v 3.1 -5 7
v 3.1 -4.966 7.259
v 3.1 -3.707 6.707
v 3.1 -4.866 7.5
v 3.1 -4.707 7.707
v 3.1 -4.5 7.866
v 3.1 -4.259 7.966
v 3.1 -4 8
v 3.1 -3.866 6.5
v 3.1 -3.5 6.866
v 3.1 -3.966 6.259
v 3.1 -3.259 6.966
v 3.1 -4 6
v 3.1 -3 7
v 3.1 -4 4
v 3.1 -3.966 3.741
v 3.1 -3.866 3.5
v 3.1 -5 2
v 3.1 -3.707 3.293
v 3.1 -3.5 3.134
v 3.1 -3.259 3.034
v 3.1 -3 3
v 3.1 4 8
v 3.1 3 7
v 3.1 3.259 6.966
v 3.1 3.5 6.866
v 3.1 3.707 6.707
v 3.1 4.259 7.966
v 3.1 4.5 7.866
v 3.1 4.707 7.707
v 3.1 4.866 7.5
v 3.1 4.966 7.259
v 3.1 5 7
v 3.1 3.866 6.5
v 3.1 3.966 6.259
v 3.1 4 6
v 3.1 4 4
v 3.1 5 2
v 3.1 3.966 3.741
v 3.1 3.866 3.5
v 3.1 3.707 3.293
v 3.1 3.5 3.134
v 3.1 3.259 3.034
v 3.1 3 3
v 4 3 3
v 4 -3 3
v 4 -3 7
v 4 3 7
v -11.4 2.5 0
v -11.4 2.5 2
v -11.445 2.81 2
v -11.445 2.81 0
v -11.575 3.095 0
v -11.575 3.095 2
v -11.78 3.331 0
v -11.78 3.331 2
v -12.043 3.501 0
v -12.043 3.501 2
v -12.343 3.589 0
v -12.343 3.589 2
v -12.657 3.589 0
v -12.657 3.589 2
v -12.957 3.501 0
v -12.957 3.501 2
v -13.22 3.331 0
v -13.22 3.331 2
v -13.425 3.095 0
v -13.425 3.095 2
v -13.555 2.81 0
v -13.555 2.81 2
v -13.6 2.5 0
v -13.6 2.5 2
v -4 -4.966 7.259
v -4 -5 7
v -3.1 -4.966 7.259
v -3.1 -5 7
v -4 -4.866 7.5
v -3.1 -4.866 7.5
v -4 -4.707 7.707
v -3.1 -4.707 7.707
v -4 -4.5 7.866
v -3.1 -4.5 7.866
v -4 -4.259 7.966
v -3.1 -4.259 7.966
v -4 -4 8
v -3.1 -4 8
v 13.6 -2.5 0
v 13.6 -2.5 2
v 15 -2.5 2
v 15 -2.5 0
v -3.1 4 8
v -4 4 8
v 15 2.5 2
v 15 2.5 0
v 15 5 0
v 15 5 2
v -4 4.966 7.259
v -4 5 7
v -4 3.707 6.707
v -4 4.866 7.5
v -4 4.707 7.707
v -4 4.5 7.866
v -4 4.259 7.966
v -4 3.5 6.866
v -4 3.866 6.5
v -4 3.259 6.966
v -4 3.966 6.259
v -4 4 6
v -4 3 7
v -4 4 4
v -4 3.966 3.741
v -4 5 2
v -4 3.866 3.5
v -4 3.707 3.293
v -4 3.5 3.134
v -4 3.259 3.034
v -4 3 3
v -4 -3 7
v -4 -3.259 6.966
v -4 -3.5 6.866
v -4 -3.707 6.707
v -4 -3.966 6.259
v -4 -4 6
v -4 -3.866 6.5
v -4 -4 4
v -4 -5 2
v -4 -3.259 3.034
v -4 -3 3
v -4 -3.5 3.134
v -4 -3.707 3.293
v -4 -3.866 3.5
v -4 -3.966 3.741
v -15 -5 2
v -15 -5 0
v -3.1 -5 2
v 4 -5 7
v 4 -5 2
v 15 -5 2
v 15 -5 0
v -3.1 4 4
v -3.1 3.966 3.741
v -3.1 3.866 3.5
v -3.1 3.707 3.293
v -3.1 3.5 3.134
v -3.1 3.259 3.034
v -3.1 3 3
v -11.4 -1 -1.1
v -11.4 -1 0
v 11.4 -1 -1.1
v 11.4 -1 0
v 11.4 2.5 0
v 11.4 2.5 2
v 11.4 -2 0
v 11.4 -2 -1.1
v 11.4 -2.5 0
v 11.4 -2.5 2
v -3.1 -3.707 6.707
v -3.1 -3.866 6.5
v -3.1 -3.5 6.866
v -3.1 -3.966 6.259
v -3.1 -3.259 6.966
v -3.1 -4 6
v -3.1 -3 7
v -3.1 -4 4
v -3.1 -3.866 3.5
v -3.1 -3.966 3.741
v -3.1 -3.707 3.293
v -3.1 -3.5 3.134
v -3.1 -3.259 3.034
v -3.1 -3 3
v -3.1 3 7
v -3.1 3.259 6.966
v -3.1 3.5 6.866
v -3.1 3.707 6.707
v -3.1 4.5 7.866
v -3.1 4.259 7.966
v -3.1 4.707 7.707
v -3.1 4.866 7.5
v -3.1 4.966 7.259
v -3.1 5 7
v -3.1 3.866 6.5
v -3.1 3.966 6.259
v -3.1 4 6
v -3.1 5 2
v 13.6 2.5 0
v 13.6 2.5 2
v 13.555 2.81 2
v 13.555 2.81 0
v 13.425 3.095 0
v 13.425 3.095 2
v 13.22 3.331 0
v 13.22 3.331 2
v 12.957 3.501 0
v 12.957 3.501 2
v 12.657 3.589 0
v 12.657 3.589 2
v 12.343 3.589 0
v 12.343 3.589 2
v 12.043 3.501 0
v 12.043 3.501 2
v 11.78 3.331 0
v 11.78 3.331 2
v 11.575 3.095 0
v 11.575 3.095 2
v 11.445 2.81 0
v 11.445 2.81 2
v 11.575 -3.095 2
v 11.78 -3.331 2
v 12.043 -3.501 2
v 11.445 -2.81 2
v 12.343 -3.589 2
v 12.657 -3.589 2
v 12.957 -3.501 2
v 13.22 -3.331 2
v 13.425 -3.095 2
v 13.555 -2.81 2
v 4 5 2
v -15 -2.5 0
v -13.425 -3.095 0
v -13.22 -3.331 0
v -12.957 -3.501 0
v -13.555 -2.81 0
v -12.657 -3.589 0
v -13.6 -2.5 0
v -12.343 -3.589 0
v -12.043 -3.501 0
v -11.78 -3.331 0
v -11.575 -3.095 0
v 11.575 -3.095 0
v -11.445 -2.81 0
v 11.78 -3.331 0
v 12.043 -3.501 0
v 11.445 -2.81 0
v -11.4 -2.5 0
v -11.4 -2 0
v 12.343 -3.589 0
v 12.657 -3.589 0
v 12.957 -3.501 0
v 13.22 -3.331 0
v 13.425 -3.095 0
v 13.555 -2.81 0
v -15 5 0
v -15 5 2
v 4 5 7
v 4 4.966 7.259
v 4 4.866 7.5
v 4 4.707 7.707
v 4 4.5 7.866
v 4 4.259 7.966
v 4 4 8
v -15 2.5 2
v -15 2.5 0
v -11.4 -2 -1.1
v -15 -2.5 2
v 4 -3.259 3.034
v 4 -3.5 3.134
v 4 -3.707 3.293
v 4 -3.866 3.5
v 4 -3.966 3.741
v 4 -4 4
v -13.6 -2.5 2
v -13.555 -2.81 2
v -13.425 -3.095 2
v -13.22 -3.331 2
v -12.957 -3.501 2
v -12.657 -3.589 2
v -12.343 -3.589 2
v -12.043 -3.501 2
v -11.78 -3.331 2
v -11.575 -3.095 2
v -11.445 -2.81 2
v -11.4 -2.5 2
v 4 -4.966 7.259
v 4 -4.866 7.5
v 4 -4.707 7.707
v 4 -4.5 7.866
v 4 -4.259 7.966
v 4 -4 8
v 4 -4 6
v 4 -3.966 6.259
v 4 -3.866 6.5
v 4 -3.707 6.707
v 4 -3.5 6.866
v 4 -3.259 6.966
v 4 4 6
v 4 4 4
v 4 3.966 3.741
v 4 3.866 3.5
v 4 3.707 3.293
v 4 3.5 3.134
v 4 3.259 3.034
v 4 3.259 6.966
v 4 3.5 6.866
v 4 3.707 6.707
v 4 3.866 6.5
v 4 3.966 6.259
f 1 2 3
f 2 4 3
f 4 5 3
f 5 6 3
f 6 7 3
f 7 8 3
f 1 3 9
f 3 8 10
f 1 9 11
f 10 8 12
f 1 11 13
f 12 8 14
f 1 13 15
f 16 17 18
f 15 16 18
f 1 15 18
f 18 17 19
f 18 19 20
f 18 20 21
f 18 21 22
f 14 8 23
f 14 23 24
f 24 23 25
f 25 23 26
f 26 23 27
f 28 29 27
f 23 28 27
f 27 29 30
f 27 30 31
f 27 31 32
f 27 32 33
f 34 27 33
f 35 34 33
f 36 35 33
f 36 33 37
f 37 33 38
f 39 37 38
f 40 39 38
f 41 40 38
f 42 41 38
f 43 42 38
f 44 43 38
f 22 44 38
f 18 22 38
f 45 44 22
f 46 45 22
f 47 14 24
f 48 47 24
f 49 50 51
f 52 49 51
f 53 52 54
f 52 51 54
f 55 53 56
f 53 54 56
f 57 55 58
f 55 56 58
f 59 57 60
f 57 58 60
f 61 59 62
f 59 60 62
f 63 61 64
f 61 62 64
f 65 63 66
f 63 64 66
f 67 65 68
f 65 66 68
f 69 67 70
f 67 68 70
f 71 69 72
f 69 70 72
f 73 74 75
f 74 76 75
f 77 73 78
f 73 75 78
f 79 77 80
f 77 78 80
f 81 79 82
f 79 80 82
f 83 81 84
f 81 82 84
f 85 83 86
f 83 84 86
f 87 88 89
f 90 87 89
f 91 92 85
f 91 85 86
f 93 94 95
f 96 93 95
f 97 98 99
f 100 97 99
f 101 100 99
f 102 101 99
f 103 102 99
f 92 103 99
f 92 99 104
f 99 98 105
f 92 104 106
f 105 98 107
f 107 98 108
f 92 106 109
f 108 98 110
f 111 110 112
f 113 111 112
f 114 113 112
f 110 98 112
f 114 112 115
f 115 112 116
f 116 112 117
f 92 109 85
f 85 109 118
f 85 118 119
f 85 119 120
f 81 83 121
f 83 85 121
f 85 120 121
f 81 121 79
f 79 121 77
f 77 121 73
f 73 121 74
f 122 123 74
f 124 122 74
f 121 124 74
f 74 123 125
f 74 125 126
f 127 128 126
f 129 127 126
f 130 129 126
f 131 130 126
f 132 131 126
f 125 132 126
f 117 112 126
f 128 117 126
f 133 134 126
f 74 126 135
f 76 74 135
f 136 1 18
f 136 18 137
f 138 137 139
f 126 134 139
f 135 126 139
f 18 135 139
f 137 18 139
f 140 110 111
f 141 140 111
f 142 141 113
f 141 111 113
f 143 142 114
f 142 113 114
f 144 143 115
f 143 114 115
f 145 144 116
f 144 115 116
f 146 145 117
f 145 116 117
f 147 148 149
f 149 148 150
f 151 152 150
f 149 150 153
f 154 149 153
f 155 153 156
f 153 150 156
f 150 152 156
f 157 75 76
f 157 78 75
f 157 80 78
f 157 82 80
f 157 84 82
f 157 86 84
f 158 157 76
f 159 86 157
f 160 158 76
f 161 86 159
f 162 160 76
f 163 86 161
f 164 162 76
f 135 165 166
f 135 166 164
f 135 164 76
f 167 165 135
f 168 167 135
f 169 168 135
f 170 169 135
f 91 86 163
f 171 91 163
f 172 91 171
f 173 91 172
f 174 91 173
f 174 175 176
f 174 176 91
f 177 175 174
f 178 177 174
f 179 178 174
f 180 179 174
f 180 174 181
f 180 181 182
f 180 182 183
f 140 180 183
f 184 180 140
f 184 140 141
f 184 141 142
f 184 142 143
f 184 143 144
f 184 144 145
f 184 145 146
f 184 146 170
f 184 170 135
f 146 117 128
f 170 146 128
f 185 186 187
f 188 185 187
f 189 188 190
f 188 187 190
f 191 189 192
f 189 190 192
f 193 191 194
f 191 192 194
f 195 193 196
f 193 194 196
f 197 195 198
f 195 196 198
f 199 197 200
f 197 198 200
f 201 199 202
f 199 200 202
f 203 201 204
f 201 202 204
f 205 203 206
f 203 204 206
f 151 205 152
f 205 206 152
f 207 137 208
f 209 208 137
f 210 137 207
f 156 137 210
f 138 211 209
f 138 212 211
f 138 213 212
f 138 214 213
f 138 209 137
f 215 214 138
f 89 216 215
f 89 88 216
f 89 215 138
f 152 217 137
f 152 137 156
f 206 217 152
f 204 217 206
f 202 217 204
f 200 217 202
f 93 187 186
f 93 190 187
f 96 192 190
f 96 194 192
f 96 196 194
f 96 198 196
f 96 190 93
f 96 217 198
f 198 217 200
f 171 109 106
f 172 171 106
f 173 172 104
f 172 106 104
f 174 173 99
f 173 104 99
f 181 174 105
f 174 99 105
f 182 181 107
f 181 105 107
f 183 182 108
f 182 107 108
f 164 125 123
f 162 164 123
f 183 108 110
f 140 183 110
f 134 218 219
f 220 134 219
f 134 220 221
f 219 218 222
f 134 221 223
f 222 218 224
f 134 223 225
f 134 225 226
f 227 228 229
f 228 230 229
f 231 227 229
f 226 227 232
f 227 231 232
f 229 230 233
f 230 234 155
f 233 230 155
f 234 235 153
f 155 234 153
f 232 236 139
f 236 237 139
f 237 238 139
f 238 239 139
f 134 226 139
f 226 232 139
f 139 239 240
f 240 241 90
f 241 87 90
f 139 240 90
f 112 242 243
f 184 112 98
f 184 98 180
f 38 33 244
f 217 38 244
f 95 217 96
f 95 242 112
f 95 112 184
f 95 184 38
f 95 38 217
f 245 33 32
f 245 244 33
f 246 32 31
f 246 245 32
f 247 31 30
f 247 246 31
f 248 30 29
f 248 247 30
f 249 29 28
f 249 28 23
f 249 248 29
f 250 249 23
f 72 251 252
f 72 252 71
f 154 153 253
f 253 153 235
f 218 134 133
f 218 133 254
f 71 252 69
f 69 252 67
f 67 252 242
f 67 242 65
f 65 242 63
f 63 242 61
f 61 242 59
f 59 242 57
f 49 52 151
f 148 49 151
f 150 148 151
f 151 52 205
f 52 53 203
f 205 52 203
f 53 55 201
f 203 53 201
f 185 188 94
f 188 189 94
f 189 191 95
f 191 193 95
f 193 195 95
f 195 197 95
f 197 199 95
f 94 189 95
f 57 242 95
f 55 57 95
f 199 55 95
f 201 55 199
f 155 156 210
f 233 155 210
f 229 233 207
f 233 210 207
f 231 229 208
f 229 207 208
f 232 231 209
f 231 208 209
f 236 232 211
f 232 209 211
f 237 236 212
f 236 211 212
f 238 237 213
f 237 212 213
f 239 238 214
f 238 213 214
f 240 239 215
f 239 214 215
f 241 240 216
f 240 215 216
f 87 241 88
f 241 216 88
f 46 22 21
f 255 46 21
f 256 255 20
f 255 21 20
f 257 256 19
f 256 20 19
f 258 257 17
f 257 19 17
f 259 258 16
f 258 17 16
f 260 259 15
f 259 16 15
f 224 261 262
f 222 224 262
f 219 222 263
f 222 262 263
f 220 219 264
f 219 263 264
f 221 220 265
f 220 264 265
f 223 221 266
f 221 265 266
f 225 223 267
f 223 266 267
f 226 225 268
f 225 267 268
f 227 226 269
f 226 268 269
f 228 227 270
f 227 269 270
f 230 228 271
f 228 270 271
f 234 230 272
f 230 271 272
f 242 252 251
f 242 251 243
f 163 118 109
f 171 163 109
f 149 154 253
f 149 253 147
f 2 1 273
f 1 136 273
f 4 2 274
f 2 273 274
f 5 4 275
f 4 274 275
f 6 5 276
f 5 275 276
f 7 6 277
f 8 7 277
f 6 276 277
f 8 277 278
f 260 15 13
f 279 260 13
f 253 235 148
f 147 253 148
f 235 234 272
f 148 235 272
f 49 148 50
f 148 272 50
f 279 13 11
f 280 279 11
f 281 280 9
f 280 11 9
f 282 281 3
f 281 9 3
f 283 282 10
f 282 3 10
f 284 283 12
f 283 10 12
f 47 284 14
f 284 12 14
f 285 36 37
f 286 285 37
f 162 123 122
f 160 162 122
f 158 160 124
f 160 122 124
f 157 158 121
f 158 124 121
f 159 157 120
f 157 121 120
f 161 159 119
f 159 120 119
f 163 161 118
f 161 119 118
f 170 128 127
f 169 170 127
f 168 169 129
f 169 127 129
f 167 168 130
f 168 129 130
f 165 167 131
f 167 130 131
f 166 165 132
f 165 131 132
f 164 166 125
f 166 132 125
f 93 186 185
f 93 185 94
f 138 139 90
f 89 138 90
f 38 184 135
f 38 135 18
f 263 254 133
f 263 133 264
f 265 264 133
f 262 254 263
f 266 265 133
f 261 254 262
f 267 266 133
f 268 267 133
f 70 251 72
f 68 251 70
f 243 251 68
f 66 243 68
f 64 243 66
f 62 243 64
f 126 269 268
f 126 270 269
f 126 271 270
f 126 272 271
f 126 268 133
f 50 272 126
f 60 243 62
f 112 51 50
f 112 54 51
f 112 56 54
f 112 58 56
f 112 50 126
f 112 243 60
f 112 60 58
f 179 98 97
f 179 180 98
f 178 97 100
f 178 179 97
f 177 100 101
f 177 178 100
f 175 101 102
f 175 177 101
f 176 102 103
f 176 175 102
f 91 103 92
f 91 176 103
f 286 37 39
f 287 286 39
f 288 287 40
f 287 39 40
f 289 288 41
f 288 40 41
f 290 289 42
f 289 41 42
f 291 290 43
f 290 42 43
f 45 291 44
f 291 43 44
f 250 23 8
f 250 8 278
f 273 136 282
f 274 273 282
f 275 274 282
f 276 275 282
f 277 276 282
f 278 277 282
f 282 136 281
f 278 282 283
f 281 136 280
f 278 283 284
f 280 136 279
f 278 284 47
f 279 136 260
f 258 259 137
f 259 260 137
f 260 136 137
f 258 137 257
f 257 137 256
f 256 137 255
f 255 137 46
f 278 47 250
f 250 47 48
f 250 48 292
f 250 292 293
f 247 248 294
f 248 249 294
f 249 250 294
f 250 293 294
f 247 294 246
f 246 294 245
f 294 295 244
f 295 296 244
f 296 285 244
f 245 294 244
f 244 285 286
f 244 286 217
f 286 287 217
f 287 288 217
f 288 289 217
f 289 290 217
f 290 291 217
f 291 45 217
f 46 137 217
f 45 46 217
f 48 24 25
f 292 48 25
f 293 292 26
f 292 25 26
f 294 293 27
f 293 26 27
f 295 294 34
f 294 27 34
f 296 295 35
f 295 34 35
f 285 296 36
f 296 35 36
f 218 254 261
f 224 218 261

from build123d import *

# Parameters (mm, degrees)
CROQUIS1_W              = 30
CROQUIS1_H              = 10
SALIENTE_EXTRUIR1_DEPTH = 2
CORTAR_EXTRUIR2_DEPTH   = 11
CROQUIS3_W              = 11.193843072
CROQUIS3_H              = 1
CROQUIS3_W_2            = 11.806156928
SALIENTE_EXTRUIR3_DEPTH = 1.5
CORTAR_EXTRUIR3_DEPTH   = 11.5
CROQUIS5_W              = 1.4
CROQUIS5_H              = 5
CORTAR_EXTRUIR4_DEPTH   = 10
CROQUIS6_W              = 8
CROQUIS6_H              = 5
SALIENTE_EXTRUIR4_DEPTH = 6
CROQUIS7_W              = 6.2
CROQUIS7_H              = 6
CORTAR_EXTRUIR5_DEPTH   = 11
CORTAR_EXTRUIR6_DEPTH   = 11
REDONDEO1_R             = 1
CROQUIS9_W              = 0.4
CROQUIS9_H              = 1
CORTAR_EXTRUIR7_DEPTH   = 23


with BuildPart() as part:
    # Croquis1 → Saliente-Extruir1 (new body)
    with BuildSketch(Plane.XY):
        Rectangle(CROQUIS1_W, CROQUIS1_H)
    extrude(amount=SALIENTE_EXTRUIR1_DEPTH)

    # Croquis2 → Cortar-Extruir2 (cut)
    with BuildSketch(Plane.XY.offset(2)):
        with BuildLine():
            Line((-13.5, -2.5), (-13.5, 2.5))
            ThreePointArc((-13.5, 2.5), (-12.5, 3.5), (-11.5, 2.5))
            Line((-11.5, 2.5), (-11.5, -2.5))
            ThreePointArc((-11.5, -2.5), (-12.5, -3.5), (-13.5, -2.5))
        make_face()
        with BuildLine():
            Line((11.5, 2.5), (11.5, -2.5))
            ThreePointArc((11.5, -2.5), (12.5, -3.5), (13.5, -2.5))
            Line((13.5, -2.5), (13.5, 2.5))
            ThreePointArc((13.5, 2.5), (12.5, 3.5), (11.5, 2.5))
        make_face()
    extrude(amount=-CORTAR_EXTRUIR2_DEPTH, mode=Mode.SUBTRACT)

    # Croquis3 → Saliente-Extruir3 (add)
    with BuildSketch(Plane(origin=(0, 0, 0), x_dir=(-1, 0, 0), z_dir=(0, 0, -1))):
        with Locations((5.903078464, -1.5)):
            Rectangle(CROQUIS3_W, CROQUIS3_H)
        with Locations((-5.596921536, -1.5)):
            Rectangle(CROQUIS3_W_2, CROQUIS3_H)
    extrude(amount=SALIENTE_EXTRUIR3_DEPTH)

    # Croquis4 → Cortar-Extruir3 (cut)
    with BuildSketch(Plane.XY.offset(2)):
        with BuildLine():
            Line((-13.6, 2.5), (-13.6, -2.5))
            ThreePointArc((-13.6, -2.5), (-12.5, -3.6), (-11.4, -2.5))
            Line((-11.4, -2.5), (-11.4, 2.5))
            ThreePointArc((-11.4, 2.5), (-12.5, 3.6), (-13.6, 2.5))
        make_face()
        with BuildLine():
            Line((11.4, 2.5), (11.4, -2.5))
            ThreePointArc((11.4, -2.5), (12.5, -3.6), (13.6, -2.5))
            Line((13.6, -2.5), (13.6, 2.5))
            ThreePointArc((13.6, 2.5), (12.5, 3.6), (11.4, 2.5))
        make_face()
    extrude(amount=-CORTAR_EXTRUIR3_DEPTH, mode=Mode.SUBTRACT)

    # Croquis5 → Cortar-Extruir4 (cut)
    with BuildSketch(Plane.XY.offset(2)):
        with Locations((-14.3, 0)):
            Rectangle(CROQUIS5_W, CROQUIS5_H)
        with Locations((14.3, 0)):
            Rectangle(CROQUIS5_W, CROQUIS5_H)
    extrude(amount=-CORTAR_EXTRUIR4_DEPTH, mode=Mode.SUBTRACT)

    # Croquis6 → Saliente-Extruir4 (add)
    with BuildSketch(Plane.XY.offset(2)):
        with Locations((0, 2.5)):
            Rectangle(CROQUIS6_W, CROQUIS6_H)
        with Locations((0, -2.5)):
            Rectangle(CROQUIS6_W, CROQUIS6_H)
    extrude(amount=SALIENTE_EXTRUIR4_DEPTH)

    # Croquis7 → Cortar-Extruir5 (cut)
    with BuildSketch(Plane(origin=(0, 5, 0), x_dir=(1, 0, 0), z_dir=(0, 1, 0))):
        with Locations((0, -5)):
            Rectangle(CROQUIS7_W, CROQUIS7_H)
    extrude(amount=-CORTAR_EXTRUIR5_DEPTH, mode=Mode.SUBTRACT)

    # Croquis8 → Cortar-Extruir6 (cut)
    with BuildSketch(Plane.ZY.offset(4)):
        with BuildLine():
            Line((5, -4), (5, 4))
            Line((5, 4), (4, 4))
            ThreePointArc((4, 4), (3.292893219, 3.707106781), (3, 3))
            Line((3, 3), (3, -3))
            ThreePointArc((3, -3), (3.292893219, -3.707106781), (4, -4))
            Line((4, -4), (5, -4))
        make_face()
        with BuildLine():
            Line((6, 4), (5, 4))
            Line((5, 4), (5, -4))
            Line((5, -4), (6, -4))
            ThreePointArc((6, -4), (6.707106781, -3.707106781), (7, -3))
            Line((7, -3), (7, 3))
            ThreePointArc((7, 3), (6.707106781, 3.707106781), (6, 4))
        make_face()
    extrude(amount=-CORTAR_EXTRUIR6_DEPTH, mode=Mode.SUBTRACT)

    # Redondeo1
    redondeo1_edges = [part.edges().sort_by_distance(p)[0] for p in [
        (3.55, 5, 8),
        (-3.55, -5, 8),
        (-3.55, 5, 8),
        (3.55, -5, 8),
    ]]
    fillet(redondeo1_edges, radius=REDONDEO1_R)

    # Croquis9 → Cortar-Extruir7 (cut)
    with BuildSketch(Plane(origin=(11.4, 0, 0), x_dir=(0, 0, -1), z_dir=(1, 0, 0))):
        with Locations((1.3, -1.5)):
            Rectangle(CROQUIS9_W, CROQUIS9_H)
    extrude(amount=-CORTAR_EXTRUIR7_DEPTH, mode=Mode.SUBTRACT)


solid = part.part
